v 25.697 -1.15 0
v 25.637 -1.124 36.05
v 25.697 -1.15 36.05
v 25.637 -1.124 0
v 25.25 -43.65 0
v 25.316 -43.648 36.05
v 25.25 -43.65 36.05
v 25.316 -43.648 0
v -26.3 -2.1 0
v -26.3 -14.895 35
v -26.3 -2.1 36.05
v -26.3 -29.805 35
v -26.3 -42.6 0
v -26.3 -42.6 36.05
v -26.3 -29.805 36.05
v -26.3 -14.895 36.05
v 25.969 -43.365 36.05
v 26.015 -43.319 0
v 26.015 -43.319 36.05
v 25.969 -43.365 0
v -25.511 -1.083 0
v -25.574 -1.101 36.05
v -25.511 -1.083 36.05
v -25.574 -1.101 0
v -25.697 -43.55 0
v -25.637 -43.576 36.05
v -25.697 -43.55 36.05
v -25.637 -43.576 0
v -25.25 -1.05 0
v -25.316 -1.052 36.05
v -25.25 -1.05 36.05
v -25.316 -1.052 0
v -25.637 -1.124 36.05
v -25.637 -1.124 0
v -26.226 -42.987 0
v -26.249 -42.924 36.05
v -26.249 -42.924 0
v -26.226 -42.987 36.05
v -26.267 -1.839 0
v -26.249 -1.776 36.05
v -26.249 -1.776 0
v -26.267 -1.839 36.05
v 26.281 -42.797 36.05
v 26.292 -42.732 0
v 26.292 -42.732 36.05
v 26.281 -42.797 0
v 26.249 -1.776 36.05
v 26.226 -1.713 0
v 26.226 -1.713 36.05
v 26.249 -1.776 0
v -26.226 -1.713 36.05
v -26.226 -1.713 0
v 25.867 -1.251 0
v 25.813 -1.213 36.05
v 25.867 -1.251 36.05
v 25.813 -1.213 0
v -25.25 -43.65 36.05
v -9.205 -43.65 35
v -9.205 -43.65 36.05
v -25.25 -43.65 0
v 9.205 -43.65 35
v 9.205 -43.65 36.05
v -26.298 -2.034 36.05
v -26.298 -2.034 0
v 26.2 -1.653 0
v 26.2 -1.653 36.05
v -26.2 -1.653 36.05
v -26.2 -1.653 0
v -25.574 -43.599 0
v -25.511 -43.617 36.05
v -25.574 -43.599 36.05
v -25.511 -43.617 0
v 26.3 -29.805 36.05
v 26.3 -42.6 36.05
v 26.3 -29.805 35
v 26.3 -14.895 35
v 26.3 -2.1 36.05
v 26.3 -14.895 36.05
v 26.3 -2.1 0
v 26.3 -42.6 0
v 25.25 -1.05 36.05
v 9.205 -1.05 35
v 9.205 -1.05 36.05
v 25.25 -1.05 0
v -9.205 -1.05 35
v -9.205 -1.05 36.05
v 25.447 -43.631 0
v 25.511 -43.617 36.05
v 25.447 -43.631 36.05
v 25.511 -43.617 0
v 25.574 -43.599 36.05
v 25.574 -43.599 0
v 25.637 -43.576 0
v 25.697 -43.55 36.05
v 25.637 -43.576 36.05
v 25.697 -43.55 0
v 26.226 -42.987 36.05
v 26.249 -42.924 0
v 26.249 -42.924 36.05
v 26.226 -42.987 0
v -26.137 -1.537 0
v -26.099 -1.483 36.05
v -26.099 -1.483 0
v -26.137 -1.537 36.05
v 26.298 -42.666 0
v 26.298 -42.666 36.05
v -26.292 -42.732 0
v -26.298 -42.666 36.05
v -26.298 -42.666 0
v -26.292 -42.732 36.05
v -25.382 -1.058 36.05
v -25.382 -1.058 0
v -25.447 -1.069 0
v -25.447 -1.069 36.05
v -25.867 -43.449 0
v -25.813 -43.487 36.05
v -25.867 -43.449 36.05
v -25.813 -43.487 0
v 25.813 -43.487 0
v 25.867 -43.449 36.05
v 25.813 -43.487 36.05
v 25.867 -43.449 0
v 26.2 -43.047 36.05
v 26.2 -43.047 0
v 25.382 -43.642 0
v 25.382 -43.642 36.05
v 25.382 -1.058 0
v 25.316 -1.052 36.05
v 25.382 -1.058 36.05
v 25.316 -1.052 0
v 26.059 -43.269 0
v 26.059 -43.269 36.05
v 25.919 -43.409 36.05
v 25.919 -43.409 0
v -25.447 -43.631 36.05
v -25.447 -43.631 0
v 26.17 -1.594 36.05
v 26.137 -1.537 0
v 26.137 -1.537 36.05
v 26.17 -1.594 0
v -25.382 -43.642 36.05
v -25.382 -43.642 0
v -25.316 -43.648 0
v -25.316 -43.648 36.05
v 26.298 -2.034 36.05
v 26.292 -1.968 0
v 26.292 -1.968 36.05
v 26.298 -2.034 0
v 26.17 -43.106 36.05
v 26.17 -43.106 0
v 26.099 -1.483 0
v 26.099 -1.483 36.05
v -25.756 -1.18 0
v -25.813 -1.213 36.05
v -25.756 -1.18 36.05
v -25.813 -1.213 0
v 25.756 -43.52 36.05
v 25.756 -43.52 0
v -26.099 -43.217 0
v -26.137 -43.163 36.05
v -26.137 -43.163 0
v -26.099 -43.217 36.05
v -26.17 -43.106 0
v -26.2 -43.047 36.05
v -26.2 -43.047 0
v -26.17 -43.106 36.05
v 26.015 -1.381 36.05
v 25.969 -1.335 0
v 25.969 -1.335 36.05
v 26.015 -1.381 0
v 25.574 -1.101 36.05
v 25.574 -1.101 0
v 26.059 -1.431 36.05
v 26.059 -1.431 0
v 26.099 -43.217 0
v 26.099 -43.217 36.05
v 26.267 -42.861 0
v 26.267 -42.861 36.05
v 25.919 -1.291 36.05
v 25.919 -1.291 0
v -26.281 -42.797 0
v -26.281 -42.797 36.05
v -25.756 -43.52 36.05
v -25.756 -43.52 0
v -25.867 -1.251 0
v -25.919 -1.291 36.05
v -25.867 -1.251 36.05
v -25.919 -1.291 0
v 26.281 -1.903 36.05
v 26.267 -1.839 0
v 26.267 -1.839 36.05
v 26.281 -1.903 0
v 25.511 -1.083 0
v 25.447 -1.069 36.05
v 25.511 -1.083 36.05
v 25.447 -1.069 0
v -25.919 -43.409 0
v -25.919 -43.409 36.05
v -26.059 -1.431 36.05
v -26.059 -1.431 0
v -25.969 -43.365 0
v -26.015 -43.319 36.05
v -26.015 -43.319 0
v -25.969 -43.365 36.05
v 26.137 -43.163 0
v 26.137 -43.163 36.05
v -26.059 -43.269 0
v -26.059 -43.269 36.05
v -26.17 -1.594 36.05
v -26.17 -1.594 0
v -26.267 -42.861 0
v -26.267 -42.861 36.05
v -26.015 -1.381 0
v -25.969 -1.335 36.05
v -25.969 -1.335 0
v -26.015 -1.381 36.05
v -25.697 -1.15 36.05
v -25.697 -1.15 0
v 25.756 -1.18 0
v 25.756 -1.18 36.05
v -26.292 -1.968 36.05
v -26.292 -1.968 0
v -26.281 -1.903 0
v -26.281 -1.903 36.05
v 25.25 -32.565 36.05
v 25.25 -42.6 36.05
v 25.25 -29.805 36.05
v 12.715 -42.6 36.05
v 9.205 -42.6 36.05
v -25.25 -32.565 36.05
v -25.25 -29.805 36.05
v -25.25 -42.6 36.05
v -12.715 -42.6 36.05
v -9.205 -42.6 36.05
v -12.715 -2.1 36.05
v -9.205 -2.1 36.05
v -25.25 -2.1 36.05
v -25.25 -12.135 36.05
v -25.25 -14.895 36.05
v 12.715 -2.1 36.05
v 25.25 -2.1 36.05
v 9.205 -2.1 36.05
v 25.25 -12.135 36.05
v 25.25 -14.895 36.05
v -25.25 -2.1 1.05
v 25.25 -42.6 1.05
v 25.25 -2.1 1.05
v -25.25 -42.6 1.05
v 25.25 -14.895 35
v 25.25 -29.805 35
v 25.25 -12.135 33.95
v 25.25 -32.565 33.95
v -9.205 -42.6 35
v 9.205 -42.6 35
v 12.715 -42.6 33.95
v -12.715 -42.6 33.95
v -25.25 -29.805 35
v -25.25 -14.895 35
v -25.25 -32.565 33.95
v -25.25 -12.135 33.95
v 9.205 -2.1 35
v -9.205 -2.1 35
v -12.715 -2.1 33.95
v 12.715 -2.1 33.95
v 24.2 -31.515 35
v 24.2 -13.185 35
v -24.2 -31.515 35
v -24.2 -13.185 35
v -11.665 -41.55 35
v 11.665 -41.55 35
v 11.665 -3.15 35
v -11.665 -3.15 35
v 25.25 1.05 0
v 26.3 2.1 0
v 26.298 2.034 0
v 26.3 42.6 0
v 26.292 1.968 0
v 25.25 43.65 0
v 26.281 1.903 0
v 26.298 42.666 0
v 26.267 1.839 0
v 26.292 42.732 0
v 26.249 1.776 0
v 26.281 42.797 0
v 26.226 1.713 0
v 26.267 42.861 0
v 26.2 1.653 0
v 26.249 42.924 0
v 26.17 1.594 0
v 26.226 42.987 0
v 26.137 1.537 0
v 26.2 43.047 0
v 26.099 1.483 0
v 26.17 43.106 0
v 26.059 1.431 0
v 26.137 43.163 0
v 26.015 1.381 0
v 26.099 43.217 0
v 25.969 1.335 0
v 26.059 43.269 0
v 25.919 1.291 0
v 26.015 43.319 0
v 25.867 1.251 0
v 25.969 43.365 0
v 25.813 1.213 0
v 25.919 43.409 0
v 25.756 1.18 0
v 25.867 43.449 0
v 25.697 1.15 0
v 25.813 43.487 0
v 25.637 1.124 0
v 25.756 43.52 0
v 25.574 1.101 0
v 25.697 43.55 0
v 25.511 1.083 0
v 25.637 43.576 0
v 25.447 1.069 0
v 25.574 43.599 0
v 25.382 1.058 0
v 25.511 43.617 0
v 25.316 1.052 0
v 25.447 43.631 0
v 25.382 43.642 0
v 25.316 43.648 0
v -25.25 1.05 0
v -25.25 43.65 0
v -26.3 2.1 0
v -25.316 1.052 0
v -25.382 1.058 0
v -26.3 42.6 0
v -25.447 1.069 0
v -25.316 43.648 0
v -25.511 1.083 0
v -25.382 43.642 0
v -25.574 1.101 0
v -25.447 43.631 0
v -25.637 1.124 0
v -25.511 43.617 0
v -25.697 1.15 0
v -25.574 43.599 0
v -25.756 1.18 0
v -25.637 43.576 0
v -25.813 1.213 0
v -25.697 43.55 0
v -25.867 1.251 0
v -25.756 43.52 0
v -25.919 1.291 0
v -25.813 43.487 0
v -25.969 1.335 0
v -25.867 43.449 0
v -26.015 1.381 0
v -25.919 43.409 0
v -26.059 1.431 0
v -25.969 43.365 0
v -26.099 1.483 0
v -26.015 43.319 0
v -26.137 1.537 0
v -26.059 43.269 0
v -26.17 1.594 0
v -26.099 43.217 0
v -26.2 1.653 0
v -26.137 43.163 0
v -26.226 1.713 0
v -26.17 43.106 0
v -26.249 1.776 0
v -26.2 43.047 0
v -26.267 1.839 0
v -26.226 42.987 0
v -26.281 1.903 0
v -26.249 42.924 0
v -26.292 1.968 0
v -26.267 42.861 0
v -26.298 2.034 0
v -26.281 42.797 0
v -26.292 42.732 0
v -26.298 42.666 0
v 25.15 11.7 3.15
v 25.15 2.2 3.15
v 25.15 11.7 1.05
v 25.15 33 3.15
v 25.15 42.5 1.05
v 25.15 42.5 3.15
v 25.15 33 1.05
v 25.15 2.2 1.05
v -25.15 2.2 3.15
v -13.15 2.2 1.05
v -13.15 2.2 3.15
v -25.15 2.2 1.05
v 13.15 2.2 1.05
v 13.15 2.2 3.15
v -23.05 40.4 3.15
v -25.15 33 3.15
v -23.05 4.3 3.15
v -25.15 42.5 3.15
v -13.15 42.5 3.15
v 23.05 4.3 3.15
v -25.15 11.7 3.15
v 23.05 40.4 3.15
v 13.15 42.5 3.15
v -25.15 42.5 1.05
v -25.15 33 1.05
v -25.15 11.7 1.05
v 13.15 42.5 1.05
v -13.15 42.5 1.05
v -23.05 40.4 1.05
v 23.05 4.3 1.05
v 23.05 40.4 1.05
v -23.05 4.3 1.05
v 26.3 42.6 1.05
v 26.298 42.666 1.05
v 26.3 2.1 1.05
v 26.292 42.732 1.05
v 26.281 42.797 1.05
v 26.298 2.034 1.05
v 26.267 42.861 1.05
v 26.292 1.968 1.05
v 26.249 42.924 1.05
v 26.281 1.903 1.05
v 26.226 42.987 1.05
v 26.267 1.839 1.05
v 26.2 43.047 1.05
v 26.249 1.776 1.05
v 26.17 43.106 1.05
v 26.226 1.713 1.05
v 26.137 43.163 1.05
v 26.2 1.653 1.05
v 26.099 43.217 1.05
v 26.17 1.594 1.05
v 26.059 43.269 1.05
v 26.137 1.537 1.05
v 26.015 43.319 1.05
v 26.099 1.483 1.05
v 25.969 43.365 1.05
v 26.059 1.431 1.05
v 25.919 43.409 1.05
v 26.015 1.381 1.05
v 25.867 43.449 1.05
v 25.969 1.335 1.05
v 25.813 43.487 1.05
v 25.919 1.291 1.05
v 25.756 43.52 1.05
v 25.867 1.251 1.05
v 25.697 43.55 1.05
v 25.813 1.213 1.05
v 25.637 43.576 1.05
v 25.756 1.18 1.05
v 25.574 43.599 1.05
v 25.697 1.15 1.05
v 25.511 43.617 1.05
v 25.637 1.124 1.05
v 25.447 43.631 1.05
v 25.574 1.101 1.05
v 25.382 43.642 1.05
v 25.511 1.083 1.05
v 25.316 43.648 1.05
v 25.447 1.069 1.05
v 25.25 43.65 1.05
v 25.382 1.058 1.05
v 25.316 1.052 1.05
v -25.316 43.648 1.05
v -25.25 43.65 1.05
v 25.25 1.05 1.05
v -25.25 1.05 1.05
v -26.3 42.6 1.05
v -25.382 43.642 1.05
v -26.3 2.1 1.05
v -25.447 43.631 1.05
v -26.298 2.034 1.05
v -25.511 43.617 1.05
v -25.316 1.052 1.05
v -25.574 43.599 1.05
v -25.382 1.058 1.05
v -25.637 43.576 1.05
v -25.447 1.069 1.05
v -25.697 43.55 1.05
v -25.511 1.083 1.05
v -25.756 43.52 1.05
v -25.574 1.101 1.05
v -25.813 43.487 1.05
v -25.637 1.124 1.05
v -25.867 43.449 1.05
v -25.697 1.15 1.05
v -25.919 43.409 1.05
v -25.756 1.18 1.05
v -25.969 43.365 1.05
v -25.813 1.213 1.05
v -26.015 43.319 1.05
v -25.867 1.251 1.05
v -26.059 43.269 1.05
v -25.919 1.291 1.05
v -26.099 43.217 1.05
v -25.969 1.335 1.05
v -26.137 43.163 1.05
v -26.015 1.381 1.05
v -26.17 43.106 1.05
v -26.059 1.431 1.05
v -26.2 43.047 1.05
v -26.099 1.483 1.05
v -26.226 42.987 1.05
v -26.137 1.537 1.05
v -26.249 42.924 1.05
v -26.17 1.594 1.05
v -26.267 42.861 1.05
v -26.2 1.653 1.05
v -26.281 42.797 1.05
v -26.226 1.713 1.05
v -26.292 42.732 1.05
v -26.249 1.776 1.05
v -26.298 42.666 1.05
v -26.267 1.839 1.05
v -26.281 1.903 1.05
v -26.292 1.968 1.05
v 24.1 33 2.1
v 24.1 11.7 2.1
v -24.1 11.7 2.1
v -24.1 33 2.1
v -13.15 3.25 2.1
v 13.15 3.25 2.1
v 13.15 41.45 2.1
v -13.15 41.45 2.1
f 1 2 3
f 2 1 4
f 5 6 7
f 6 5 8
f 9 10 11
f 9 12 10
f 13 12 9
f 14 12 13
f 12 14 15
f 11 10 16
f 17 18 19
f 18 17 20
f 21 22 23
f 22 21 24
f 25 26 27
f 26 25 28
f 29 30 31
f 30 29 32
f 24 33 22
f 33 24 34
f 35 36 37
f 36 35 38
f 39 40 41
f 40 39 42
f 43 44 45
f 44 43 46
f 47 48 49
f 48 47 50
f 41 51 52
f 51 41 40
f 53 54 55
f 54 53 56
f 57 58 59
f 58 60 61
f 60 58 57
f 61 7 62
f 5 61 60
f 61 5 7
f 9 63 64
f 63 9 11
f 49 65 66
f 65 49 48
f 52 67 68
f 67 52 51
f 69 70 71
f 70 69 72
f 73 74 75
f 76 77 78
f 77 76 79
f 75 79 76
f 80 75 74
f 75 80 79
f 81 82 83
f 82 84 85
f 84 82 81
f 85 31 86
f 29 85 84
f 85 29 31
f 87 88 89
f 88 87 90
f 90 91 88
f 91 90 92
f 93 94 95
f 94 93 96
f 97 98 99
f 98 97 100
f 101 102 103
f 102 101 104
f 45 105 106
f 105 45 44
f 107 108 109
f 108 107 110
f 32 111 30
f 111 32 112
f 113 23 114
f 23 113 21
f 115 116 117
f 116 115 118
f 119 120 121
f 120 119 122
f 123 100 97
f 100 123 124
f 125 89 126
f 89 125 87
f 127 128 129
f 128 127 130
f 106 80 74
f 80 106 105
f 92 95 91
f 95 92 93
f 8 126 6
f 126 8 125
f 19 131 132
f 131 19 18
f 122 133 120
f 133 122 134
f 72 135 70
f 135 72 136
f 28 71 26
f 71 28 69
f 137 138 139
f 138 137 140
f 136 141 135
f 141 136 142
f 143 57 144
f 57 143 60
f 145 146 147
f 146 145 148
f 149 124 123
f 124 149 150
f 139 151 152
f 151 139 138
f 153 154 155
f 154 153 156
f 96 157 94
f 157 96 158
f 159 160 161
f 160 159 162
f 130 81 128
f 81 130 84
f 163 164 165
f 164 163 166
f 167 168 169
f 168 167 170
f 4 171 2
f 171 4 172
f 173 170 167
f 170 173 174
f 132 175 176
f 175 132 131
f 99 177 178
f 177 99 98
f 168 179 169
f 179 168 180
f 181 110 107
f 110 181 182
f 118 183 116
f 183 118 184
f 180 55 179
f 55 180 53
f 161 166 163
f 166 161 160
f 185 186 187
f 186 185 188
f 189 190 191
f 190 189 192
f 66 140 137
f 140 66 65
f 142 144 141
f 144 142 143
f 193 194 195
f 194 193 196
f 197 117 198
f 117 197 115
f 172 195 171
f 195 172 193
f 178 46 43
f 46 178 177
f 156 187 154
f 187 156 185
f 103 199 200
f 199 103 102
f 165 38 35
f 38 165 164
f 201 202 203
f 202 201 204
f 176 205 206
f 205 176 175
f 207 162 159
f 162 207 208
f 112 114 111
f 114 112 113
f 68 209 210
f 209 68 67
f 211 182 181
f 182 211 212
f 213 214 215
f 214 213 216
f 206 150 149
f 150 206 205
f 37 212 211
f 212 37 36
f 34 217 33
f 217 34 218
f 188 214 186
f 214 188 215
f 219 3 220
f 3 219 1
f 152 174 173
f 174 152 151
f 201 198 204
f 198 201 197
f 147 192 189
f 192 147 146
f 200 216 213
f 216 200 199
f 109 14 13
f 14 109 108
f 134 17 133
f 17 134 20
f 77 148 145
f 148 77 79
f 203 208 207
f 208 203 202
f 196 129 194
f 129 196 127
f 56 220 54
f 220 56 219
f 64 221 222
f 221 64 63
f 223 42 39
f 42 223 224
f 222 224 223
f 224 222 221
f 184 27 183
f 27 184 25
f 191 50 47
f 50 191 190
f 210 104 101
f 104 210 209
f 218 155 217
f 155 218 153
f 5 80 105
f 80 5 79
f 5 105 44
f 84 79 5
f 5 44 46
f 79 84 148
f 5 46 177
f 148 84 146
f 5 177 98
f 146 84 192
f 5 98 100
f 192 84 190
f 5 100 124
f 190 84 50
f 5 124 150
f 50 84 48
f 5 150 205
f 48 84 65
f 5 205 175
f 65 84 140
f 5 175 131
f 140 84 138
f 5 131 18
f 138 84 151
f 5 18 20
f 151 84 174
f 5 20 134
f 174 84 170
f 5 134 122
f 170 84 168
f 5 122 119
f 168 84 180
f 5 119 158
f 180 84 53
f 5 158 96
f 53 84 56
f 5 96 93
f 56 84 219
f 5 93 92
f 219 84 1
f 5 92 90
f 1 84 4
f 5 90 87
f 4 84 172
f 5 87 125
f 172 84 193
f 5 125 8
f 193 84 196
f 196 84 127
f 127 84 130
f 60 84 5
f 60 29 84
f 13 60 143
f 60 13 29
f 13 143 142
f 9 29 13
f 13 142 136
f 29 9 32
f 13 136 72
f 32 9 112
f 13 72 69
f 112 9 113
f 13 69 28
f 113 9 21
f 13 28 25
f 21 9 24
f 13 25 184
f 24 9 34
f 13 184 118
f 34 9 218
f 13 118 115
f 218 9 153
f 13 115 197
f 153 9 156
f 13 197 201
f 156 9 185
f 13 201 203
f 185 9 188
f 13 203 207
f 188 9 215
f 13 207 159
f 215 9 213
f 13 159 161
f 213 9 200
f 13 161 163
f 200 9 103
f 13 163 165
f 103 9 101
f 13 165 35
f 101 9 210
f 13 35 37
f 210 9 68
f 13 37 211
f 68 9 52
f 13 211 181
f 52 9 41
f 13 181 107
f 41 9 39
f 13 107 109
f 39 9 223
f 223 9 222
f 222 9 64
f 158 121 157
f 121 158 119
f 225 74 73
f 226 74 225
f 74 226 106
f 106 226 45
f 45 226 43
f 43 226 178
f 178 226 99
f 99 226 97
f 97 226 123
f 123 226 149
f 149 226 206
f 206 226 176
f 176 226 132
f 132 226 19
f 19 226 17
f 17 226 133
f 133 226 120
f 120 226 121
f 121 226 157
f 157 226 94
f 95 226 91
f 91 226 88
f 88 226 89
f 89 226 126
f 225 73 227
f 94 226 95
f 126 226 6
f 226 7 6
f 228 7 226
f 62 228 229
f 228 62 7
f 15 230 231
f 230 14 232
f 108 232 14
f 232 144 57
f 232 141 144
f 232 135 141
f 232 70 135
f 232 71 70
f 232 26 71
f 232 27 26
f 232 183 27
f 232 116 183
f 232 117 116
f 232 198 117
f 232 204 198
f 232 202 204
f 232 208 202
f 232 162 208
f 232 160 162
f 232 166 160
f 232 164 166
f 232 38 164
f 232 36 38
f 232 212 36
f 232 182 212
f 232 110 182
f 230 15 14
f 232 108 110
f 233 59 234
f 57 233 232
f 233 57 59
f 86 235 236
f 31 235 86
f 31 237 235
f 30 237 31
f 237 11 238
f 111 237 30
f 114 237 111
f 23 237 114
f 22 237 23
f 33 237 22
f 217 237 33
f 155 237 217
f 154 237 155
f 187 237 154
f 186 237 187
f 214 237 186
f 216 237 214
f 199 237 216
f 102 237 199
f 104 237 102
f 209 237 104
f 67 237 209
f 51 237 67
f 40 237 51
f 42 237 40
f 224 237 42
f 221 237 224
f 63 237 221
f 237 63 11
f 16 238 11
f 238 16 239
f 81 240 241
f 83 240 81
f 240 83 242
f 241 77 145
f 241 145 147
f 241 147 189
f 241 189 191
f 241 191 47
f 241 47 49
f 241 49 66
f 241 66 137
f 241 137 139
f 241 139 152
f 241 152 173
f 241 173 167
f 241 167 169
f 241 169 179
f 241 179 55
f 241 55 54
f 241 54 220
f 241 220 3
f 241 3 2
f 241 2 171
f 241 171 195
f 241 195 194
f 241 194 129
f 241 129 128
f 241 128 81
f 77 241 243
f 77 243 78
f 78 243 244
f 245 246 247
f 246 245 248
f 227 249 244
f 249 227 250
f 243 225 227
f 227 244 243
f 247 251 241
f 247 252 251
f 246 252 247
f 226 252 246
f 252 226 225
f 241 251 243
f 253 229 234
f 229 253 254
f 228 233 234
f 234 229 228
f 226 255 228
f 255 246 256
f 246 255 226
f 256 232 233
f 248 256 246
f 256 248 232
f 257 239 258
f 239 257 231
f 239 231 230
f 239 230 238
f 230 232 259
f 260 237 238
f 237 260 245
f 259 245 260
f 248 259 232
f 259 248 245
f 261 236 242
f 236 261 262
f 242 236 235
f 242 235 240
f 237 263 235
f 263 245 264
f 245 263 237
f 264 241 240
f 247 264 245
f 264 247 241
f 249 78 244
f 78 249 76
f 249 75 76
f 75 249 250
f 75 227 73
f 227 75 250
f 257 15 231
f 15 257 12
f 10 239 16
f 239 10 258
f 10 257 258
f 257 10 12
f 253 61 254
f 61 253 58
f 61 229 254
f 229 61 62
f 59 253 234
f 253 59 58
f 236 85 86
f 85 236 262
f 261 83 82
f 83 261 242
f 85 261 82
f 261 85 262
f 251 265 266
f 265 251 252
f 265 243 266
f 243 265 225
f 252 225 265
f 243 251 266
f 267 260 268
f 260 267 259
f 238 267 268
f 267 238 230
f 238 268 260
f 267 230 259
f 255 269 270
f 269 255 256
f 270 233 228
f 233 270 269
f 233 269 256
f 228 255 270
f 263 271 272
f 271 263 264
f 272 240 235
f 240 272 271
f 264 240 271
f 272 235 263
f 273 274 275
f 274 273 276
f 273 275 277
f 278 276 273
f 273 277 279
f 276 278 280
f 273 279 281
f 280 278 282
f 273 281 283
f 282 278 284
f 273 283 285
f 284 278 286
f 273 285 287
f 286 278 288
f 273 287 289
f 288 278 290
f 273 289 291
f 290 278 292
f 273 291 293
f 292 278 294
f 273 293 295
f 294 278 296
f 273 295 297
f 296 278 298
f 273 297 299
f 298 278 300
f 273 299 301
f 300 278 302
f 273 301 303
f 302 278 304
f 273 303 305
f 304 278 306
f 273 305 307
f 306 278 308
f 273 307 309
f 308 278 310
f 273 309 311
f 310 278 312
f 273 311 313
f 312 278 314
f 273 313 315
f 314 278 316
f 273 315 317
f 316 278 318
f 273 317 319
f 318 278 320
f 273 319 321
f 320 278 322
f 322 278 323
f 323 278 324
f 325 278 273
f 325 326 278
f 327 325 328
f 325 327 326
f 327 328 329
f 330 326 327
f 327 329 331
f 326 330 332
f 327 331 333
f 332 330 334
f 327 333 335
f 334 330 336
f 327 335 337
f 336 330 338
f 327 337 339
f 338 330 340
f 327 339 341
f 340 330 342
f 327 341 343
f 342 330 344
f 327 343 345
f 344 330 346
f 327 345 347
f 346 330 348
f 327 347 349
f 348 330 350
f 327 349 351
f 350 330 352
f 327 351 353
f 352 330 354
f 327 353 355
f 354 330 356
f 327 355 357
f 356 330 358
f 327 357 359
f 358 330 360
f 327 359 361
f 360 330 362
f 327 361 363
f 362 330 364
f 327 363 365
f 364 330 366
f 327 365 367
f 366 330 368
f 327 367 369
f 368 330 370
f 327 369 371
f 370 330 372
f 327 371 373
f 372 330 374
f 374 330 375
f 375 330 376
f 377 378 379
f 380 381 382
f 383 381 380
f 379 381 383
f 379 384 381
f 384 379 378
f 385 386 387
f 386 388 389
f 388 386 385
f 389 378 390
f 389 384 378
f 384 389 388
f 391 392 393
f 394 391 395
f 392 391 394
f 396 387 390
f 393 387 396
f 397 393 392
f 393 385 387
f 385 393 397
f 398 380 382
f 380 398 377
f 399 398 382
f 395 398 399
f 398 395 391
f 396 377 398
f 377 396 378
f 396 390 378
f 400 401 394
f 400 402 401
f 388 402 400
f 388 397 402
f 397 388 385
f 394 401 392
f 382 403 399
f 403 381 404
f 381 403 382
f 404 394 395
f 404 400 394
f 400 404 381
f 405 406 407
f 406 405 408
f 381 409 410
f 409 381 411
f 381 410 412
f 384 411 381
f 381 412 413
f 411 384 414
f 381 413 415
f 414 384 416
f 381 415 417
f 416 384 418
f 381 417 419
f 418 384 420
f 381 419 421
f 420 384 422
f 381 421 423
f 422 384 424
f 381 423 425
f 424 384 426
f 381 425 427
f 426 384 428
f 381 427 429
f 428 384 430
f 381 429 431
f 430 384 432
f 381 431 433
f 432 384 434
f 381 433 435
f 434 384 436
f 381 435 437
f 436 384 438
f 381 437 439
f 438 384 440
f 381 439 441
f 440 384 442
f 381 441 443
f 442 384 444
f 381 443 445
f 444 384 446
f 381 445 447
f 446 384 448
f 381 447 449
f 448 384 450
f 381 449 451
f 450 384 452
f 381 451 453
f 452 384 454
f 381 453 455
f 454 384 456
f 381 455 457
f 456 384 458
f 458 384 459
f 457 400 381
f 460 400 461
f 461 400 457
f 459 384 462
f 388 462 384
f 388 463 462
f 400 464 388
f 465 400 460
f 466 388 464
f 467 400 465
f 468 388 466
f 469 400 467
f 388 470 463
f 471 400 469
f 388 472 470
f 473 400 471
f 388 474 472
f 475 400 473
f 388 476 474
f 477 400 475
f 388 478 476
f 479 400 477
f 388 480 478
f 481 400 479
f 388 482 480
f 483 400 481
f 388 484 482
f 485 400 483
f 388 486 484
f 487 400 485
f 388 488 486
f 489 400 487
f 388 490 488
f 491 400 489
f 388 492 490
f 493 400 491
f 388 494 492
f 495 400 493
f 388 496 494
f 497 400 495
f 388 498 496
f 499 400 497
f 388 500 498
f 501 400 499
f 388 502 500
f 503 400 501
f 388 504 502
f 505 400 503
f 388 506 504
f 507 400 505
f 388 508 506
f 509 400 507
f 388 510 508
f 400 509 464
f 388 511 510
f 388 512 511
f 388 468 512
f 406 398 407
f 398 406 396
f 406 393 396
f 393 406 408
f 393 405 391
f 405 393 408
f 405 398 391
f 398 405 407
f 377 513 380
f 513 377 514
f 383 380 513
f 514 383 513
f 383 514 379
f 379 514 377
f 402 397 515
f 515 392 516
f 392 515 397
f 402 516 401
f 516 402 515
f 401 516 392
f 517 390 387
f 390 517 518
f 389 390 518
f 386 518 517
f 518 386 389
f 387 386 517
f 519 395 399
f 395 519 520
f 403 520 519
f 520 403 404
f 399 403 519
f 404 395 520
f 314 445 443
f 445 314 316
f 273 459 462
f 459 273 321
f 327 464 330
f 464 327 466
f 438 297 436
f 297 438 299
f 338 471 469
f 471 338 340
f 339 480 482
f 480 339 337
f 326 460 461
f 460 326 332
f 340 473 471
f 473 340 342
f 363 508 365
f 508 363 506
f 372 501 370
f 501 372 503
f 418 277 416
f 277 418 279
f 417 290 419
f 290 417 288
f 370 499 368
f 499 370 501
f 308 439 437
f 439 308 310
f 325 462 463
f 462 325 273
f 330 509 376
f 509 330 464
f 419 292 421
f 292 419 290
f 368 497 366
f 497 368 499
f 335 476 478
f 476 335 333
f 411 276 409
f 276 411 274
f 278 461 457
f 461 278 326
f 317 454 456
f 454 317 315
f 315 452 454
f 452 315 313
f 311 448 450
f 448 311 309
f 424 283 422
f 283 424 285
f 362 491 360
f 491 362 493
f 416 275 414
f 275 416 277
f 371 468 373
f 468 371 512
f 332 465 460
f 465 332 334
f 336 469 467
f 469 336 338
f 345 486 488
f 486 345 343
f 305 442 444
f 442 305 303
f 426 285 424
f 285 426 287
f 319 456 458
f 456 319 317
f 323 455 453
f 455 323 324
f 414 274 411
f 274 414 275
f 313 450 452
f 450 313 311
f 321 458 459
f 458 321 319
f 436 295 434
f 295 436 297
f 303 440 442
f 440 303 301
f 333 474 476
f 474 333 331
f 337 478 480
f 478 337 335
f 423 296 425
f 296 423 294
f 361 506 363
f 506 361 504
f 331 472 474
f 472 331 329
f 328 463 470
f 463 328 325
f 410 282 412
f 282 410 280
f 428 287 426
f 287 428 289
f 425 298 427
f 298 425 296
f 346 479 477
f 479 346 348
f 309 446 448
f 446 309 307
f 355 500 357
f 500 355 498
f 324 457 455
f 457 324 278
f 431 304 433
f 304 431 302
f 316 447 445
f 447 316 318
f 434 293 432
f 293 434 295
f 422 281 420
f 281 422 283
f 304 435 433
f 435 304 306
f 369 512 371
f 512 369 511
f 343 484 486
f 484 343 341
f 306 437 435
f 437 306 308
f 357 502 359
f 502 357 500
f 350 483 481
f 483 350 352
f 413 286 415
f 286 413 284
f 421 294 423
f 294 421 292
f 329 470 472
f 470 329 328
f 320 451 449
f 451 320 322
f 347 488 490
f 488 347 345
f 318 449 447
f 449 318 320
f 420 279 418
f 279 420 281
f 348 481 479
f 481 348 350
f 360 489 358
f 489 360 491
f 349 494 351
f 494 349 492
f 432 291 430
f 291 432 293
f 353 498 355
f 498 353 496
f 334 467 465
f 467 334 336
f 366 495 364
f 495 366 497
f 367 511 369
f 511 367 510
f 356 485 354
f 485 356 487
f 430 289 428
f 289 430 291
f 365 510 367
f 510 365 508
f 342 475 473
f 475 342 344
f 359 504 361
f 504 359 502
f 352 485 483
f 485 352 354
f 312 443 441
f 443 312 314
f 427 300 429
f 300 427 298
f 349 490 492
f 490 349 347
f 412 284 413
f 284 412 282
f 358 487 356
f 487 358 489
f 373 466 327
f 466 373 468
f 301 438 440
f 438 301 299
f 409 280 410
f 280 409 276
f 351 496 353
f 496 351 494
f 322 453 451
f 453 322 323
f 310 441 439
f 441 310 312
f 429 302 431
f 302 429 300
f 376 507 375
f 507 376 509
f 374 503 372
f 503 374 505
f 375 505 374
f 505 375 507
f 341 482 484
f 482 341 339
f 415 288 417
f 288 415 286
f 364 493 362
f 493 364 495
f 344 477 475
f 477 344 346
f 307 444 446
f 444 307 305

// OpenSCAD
// Which one would you like to see?
part = "both"; // [box:Box only, top: Top cover only, both: Box and top cover]

// Size of your printer's nozzle in mm
nozzle_size = 0.35;

// Number of walls the print should have
number_of_walls = 3; // [1:5]

// Tolerance (use 0.2 for FDM)
tolerance = 0.2; // [0.1:0.1:0.4]

// Interior dimension X in mm
interior_x=50.5;

// Interior dimension Y in mm
interior_y=40.5;

// Interior dimension Z in mm
interior_z=35;

// interior corner radius in mm
radius=0; // [0:20]

// What fraction of the flat X side should the hook take up? (0 for no hook)
x_hook_fraction = 0.5; // [0:0.1:1.0]

// What fraction of the flat Y side should the hook take up? (0 for no hook)
y_hook_fraction = 0.5; // [0:0.1:1.0]

// What fraction of the hooks should have a slot behind them? (0 for no slot)
slot_length = 0.7; // [0:0.1:1]

/* Hidden */
$fn=100;

wall_thickness=nozzle_size*number_of_walls;

// Outer dimensions
x = interior_x + 2 * wall_thickness;
y = interior_y + 2 * wall_thickness;
z = interior_z + 2 * wall_thickness;

hook_thickness = 3 * nozzle_size;

top_cover_wall_thickness = hook_thickness + wall_thickness;

y_hook_length = (y - 2 * radius) * y_hook_fraction;
x_hook_length = (x - 2 * radius) * x_hook_fraction;

module box_interior () {
    offset(r=radius) {
        square([interior_x-2*radius, interior_y-2*radius], center=true);
    }
}

module box_exterior () {
    offset(r=wall_thickness) {
        box_interior();
    }
}

module bottom_box () {
    difference(){
        // Solid box
        linear_extrude(z-wall_thickness){
            box_exterior();
        }
        
        // Hollow out
        translate([0,0,wall_thickness]) linear_extrude(z){
            box_interior();
        }
        left_slot();
        rotate([180,180,0]) left_slot(); // right slot
        front_slot();
        rotate([180,180,0]) front_slot(); // back slot
    }
    left_hook(); // left hook
    rotate([180,180,0]) left_hook(); // right hook
    front_hook(); // front hook
    rotate([180,180,0]) front_hook(); // back hook
}

module left_hook () {
    translate([(x-2*wall_thickness)/2,-y_hook_length/2,z-wall_thickness]) rotate([0,90,90]) {
        base_hook(y_hook_length);
    }
}

module front_hook () {
    translate([-x_hook_length/2,-y/2+wall_thickness,z-wall_thickness]) rotate([90,90,90]) {
        base_hook(x_hook_length);
    }
}

module base_hook (hook_length) {
    difference(){
        linear_extrude(hook_length){
            polygon(points=[[0,0],[2*hook_thickness,0],[hook_thickness,hook_thickness]]);
        }
        translate([hook_thickness, hook_thickness, 0]) rotate([45,0,0]) cube(2*hook_thickness, center=true);
        translate([hook_thickness, hook_thickness, hook_length]) rotate([45,0,0]) cube(2*hook_thickness, center=true);        
    }
}

module left_slot () {
    slot_length = y_hook_length*slot_length;
    epsilon=2; // ensure it definitely protrudes
    translate([x/2+epsilon,-slot_length/2,z]) rotate([0,90,90]) {
        cube([2*hook_thickness, wall_thickness+epsilon, slot_length]);
    }
}

module front_slot () {
    slot_length = x_hook_length*slot_length;
    epsilon=2; // ensure it definitely protrudes
    translate([-slot_length/2,-y/2-epsilon,z]) rotate([90,90,90]) {
        cube([2*hook_thickness, wall_thickness+epsilon, slot_length]);
    }
}

module right_groove () {
    translate([-tolerance/2+(x-2*wall_thickness)/2,-y_hook_length/2,wall_thickness+hook_thickness*2]) rotate([0,90,90]) linear_extrude(y_hook_length) {
        base_groove();
    }
}


module front_groove () {
    translate([-x_hook_length/2,-y/2+wall_thickness+tolerance/2,wall_thickness+hook_thickness*2]) rotate([90,90,90]) linear_extrude(x_hook_length){
        base_groove();
    }
}

module base_groove () {
    polygon(points=[[0,0],[0, -1], [2*hook_thickness, -1],[2*hook_thickness,0],[hook_thickness,hook_thickness]]);
}

module top_cover () {

    // Top face
    linear_extrude(wall_thickness) {
        box_exterior();
    }
    
    difference(){
        // Wall of top cover
        inset = wall_thickness + tolerance/2;
        linear_extrude(wall_thickness+hook_thickness*2){
            offset(r=-inset) {
                box_exterior();
            }
        }
        
        // Hollow out
        translate([0,0,wall_thickness]) linear_extrude(z){
            offset(r=-wall_thickness*2) {
                offset(r=-inset) {
                    box_exterior();
                }
            }
        }
        
        right_groove();
        rotate([180,180,0]) right_groove();
        front_groove();
        rotate([180,180,0])  front_groove();
    }
  

}

// left_hook();
print_part();

module print_part() {
	if (part == "box") {
		bottom_box();
	} else if (part == "top") {
		top_cover();
	} else if (part == "both") {
		both();
	} else {
		both();
	}
}

module both() {
	translate([0,-(y/2+wall_thickness),0]) bottom_box();
    translate([0,+(y/2+wall_thickness),0]) top_cover();
}
